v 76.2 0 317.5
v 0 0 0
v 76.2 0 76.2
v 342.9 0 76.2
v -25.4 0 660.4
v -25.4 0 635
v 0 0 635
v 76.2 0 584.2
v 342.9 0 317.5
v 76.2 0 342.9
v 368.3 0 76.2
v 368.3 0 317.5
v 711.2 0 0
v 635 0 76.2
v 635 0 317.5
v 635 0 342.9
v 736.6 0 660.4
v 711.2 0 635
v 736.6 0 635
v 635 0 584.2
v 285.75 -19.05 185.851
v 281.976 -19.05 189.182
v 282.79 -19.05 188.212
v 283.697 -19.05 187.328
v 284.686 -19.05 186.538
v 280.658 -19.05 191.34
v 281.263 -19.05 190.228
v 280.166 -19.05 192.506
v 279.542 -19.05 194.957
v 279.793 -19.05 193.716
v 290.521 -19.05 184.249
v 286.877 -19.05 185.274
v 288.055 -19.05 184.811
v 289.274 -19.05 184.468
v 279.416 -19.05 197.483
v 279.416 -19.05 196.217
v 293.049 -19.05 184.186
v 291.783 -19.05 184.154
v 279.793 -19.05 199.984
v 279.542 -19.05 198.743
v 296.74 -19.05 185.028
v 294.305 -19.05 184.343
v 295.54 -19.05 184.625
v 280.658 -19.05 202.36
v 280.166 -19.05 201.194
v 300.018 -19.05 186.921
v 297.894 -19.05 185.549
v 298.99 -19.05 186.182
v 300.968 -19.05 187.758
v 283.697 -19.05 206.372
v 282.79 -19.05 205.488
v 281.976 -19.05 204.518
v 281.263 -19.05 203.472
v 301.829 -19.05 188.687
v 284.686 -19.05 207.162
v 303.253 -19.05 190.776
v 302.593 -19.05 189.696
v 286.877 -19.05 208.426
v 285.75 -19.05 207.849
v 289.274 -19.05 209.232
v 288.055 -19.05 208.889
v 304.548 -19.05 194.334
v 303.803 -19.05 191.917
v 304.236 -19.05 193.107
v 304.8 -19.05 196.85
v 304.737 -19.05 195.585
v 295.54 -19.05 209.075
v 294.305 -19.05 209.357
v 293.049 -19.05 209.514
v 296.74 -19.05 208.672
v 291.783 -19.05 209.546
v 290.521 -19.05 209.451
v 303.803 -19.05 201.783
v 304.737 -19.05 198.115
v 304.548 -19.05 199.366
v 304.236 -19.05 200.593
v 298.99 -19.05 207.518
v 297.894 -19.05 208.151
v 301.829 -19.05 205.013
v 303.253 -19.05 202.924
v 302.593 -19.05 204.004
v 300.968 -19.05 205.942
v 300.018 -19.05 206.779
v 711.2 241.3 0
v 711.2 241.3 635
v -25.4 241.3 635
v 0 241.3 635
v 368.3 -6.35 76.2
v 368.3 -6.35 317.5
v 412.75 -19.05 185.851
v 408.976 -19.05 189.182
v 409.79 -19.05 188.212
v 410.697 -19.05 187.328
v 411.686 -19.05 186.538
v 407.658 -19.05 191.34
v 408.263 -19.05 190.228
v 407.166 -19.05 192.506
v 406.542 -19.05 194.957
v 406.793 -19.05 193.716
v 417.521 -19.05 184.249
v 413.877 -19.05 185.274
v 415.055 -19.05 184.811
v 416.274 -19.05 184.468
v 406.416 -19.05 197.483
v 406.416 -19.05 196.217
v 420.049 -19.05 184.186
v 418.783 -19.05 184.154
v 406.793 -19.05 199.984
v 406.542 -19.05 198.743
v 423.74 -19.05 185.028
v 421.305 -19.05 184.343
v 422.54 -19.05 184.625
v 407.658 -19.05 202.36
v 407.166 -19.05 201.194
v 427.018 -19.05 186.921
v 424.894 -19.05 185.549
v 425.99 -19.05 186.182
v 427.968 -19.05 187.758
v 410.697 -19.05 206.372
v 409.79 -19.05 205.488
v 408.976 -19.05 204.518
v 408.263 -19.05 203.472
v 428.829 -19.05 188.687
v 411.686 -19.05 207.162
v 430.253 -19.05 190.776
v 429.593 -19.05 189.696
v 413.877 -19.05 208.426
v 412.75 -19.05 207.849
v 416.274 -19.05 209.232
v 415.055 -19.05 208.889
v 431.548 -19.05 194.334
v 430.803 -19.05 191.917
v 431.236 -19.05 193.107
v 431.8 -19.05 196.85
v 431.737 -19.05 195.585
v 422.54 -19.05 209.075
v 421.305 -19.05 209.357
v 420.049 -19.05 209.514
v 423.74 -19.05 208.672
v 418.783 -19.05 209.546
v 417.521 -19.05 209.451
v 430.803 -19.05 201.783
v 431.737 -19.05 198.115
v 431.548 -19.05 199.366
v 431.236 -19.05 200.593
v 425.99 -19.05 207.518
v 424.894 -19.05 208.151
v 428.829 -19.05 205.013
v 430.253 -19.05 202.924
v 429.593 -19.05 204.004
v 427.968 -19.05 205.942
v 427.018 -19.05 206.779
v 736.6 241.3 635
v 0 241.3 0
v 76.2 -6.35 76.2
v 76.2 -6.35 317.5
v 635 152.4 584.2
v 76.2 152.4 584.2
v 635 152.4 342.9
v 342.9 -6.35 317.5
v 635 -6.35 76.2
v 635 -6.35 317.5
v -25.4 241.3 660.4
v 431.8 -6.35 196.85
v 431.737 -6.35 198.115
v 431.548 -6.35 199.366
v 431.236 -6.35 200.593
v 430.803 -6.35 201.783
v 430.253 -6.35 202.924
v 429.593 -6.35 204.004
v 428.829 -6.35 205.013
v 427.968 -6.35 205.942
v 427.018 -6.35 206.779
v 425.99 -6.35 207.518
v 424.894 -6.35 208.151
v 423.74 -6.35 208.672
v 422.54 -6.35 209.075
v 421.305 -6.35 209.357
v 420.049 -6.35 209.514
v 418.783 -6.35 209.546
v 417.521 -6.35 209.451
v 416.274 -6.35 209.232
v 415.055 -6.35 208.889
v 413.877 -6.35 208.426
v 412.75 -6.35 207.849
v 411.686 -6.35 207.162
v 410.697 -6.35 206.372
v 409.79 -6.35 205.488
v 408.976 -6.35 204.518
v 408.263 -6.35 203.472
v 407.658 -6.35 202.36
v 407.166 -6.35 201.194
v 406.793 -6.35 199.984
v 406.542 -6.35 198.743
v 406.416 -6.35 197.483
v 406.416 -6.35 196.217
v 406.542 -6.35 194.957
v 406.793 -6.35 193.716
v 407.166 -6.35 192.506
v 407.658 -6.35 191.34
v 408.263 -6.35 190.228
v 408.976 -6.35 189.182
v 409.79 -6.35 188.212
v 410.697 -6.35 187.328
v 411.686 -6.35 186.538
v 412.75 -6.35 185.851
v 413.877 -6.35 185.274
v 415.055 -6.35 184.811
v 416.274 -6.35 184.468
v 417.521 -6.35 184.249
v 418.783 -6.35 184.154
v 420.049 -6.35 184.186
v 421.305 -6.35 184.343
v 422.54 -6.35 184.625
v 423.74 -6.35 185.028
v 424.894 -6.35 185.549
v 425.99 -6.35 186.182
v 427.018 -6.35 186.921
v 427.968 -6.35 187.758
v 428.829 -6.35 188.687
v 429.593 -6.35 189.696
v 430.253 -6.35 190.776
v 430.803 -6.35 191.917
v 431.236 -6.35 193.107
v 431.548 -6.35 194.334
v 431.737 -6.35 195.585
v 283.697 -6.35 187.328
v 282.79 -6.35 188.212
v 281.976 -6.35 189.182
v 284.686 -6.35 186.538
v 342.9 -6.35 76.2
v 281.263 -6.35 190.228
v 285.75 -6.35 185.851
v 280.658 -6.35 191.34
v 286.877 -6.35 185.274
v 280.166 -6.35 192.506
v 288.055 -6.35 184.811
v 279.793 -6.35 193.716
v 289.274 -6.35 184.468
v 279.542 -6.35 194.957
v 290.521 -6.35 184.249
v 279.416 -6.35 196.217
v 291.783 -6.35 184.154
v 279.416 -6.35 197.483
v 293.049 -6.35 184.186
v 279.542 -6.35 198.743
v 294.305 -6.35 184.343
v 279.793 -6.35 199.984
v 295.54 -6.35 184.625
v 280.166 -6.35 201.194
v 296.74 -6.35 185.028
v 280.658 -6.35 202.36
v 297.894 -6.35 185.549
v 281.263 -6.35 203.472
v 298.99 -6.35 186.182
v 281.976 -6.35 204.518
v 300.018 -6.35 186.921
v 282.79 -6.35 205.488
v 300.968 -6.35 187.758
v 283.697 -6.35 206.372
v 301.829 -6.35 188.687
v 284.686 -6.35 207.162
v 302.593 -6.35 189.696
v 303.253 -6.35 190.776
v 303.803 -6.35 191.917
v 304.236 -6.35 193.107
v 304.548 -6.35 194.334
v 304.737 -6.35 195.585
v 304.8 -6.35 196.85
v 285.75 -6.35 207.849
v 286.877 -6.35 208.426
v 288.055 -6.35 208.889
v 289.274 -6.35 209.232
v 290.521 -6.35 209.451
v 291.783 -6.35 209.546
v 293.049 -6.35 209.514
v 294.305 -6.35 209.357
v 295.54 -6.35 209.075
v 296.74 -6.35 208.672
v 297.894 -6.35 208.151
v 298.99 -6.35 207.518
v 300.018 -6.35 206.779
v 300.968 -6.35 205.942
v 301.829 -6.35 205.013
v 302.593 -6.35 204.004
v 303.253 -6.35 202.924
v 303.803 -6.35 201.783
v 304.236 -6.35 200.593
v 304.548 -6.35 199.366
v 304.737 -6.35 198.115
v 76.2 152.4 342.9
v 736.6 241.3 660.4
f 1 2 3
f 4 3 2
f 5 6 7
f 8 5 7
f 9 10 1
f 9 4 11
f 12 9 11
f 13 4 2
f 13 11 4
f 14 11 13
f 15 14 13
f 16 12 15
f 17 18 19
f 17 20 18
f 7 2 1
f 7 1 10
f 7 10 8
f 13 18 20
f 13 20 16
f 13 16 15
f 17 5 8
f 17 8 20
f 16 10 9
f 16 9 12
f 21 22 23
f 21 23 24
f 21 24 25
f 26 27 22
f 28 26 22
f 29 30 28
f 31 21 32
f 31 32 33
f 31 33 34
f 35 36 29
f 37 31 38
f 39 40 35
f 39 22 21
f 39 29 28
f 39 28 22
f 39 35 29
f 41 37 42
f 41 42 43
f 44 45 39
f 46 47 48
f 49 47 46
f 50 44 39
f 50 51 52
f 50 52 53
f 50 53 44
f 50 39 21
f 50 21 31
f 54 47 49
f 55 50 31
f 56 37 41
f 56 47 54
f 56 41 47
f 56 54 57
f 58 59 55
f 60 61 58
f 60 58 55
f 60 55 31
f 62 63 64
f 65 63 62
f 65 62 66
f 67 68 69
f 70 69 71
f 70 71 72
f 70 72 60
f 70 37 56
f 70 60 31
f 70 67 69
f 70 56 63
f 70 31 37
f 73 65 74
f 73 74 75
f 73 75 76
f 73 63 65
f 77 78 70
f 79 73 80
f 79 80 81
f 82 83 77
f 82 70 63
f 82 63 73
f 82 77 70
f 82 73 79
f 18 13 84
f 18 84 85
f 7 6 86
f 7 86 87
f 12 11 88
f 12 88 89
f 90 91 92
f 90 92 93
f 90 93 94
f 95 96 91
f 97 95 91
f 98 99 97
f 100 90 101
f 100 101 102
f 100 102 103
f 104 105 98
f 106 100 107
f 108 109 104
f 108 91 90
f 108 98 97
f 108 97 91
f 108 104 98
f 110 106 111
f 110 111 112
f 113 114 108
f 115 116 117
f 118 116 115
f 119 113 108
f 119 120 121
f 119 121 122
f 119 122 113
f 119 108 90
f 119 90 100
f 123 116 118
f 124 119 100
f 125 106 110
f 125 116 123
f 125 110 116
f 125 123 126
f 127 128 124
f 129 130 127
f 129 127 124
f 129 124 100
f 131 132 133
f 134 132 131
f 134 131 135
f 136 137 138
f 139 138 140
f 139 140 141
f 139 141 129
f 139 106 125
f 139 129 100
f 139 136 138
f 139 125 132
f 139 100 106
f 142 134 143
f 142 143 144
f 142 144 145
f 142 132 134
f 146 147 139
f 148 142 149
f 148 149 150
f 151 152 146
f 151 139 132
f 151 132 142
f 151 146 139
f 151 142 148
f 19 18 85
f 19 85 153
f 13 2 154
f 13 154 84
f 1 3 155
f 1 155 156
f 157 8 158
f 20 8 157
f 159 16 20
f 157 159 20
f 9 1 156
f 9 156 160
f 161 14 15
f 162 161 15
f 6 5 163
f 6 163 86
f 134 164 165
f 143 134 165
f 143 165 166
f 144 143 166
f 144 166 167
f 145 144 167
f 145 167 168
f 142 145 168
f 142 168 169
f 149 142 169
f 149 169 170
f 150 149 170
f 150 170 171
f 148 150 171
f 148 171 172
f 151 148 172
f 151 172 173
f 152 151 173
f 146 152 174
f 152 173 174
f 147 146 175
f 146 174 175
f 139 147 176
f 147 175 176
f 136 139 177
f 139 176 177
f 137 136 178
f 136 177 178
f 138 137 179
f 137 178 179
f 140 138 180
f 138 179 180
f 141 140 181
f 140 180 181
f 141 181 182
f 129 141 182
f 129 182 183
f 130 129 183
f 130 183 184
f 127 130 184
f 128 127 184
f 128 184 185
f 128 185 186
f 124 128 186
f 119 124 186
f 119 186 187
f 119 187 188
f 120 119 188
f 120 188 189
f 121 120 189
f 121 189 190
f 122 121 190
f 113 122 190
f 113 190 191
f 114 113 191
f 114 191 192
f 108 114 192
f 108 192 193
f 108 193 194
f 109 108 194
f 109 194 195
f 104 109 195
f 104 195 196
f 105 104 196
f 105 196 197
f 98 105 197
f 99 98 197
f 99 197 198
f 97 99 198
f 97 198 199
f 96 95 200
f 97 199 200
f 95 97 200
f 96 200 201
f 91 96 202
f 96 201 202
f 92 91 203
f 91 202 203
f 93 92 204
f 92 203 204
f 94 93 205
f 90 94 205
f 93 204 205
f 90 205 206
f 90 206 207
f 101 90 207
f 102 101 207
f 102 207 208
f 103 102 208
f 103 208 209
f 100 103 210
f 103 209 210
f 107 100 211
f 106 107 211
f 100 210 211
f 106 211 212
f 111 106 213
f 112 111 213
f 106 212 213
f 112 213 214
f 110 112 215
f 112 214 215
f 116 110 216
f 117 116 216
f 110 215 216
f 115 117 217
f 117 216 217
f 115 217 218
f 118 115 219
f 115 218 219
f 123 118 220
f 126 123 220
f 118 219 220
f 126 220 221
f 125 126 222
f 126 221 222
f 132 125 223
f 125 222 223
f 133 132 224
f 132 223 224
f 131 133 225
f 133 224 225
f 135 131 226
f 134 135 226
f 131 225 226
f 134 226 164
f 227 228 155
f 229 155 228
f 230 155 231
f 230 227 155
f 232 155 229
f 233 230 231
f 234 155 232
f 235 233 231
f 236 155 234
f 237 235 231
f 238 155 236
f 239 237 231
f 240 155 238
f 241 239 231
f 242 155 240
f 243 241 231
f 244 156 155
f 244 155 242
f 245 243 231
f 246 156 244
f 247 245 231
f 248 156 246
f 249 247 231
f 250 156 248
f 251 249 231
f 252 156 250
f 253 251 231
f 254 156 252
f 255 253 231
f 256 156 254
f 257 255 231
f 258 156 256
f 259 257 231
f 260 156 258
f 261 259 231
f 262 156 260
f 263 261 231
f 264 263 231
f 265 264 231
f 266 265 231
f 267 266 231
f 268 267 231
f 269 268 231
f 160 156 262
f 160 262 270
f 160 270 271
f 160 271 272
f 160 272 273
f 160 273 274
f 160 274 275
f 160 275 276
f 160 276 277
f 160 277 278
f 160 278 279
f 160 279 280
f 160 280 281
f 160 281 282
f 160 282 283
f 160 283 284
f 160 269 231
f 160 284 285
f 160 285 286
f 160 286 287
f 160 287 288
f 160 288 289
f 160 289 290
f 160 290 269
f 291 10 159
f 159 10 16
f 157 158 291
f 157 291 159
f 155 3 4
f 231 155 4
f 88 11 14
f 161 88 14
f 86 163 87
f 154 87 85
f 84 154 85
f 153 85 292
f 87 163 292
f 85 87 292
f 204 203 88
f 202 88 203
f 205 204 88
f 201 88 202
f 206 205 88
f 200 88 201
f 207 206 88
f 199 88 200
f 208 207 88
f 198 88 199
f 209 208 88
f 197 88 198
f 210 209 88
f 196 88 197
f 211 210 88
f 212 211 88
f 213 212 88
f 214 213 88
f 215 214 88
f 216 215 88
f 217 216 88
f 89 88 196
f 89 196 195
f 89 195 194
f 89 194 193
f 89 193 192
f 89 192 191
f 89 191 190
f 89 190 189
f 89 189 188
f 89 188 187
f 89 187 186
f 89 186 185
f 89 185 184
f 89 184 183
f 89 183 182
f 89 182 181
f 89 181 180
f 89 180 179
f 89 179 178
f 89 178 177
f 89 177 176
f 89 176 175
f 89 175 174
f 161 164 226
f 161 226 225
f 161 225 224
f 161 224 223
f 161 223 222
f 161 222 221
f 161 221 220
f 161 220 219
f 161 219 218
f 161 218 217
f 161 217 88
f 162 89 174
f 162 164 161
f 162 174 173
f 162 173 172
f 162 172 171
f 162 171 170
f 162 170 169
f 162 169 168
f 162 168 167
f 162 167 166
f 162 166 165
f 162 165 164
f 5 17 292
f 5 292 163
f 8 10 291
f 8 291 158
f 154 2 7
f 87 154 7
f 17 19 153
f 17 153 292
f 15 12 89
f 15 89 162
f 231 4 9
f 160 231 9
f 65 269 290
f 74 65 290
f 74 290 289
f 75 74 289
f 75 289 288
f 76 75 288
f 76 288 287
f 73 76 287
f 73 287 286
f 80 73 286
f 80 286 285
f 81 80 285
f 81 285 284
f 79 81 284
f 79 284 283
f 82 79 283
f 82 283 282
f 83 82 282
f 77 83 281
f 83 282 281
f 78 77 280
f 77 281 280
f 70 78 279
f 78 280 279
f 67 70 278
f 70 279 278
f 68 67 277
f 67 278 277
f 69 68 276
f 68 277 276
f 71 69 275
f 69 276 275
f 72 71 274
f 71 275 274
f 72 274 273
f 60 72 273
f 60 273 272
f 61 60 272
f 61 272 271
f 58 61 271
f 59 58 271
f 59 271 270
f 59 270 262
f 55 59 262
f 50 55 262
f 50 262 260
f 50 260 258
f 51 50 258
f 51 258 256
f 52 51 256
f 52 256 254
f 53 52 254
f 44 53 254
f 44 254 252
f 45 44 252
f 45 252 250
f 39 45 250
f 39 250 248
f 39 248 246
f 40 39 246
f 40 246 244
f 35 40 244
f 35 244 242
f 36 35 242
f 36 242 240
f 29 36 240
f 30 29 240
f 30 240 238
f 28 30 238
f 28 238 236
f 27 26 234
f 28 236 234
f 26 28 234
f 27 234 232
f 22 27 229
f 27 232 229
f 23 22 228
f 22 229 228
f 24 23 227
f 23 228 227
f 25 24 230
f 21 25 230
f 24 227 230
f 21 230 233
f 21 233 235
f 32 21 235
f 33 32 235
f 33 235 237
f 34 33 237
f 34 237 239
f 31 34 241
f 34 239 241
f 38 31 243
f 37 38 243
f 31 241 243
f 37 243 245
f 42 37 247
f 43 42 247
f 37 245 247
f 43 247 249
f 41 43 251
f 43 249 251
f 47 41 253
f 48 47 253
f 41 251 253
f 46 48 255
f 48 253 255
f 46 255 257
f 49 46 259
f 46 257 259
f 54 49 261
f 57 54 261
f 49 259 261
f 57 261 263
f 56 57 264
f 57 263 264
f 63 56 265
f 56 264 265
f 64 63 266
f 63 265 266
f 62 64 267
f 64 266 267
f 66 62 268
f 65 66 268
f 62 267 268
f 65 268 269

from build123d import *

# Parameters (mm, degrees)
F0_W     = 711.2
F0_H     = 635
F0_W_2   = 266.7
F0_H_2   = 241.3
F0_W_3   = 558.8
F0_R     = 12.7
F1_DEPTH = 241.3
F2_DEPTH = 152.4
F3_DEPTH = 6.35
F4_DEPTH = 19.05


with BuildPart() as f1:
    # F0 (on Front) → F1 (new body)
    with BuildSketch(Plane.XZ):
        with Locations((355.6, 317.5)):
            Rectangle(F0_W, F0_H)
        with Locations((209.55, 196.85)):
            Rectangle(F0_W_2, F0_H_2, mode=Mode.SUBTRACT)
        with Locations((501.65, 196.85)):
            Rectangle(F0_W_2, F0_H_2, mode=Mode.SUBTRACT)
        with Locations((355.6, 463.55)):
            Rectangle(F0_W_3, F0_H_2, mode=Mode.SUBTRACT)
        Polygon((-25.4, 635), (0, 635), (711.2, 635), (736.6, 635), (736.6, 660.4), (-25.4, 660.4), align=None)
        with Locations((209.55, 196.85)):
            Rectangle(F0_W_2, F0_H_2)
        with Locations((292.1, 196.85)):
            Circle(F0_R, mode=Mode.SUBTRACT)
        with Locations((501.65, 196.85)):
            Rectangle(F0_W_2, F0_H_2)
        with Locations((419.1, 196.85)):
            Circle(F0_R, mode=Mode.SUBTRACT)
        with Locations((419.1, 196.85)):
            Circle(F0_R)
        with Locations((292.1, 196.85)):
            Circle(F0_R)
        with Locations((355.6, 463.55)):
            Rectangle(F0_W_3, F0_H_2)
    extrude(amount=-F1_DEPTH)

    # F0 (on Front) → F2 (cut)
    with BuildSketch(Plane.XZ):
        with Locations((355.6, 463.55)):
            Rectangle(F0_W_3, F0_H_2)
    extrude(amount=-F2_DEPTH, mode=Mode.SUBTRACT)

    # F0 (on Front) → F3 (join)
    with BuildSketch(Plane.XZ):
        with Locations((209.55, 196.85)):
            Rectangle(F0_W_2, F0_H_2)
        with Locations((292.1, 196.85)):
            Circle(F0_R, mode=Mode.SUBTRACT)
        with Locations((501.65, 196.85)):
            Rectangle(F0_W_2, F0_H_2)
        with Locations((419.1, 196.85)):
            Circle(F0_R, mode=Mode.SUBTRACT)
        with Locations((419.1, 196.85)):
            Circle(F0_R)
        with Locations((292.1, 196.85)):
            Circle(F0_R)
    extrude(amount=F3_DEPTH)

    # F0 (on Front) → F4 (join)
    with BuildSketch(Plane.XZ):
        with Locations((419.1, 196.85)):
            Circle(F0_R)
        with Locations((292.1, 196.85)):
            Circle(F0_R)
    extrude(amount=F4_DEPTH)


solid = f1.part
